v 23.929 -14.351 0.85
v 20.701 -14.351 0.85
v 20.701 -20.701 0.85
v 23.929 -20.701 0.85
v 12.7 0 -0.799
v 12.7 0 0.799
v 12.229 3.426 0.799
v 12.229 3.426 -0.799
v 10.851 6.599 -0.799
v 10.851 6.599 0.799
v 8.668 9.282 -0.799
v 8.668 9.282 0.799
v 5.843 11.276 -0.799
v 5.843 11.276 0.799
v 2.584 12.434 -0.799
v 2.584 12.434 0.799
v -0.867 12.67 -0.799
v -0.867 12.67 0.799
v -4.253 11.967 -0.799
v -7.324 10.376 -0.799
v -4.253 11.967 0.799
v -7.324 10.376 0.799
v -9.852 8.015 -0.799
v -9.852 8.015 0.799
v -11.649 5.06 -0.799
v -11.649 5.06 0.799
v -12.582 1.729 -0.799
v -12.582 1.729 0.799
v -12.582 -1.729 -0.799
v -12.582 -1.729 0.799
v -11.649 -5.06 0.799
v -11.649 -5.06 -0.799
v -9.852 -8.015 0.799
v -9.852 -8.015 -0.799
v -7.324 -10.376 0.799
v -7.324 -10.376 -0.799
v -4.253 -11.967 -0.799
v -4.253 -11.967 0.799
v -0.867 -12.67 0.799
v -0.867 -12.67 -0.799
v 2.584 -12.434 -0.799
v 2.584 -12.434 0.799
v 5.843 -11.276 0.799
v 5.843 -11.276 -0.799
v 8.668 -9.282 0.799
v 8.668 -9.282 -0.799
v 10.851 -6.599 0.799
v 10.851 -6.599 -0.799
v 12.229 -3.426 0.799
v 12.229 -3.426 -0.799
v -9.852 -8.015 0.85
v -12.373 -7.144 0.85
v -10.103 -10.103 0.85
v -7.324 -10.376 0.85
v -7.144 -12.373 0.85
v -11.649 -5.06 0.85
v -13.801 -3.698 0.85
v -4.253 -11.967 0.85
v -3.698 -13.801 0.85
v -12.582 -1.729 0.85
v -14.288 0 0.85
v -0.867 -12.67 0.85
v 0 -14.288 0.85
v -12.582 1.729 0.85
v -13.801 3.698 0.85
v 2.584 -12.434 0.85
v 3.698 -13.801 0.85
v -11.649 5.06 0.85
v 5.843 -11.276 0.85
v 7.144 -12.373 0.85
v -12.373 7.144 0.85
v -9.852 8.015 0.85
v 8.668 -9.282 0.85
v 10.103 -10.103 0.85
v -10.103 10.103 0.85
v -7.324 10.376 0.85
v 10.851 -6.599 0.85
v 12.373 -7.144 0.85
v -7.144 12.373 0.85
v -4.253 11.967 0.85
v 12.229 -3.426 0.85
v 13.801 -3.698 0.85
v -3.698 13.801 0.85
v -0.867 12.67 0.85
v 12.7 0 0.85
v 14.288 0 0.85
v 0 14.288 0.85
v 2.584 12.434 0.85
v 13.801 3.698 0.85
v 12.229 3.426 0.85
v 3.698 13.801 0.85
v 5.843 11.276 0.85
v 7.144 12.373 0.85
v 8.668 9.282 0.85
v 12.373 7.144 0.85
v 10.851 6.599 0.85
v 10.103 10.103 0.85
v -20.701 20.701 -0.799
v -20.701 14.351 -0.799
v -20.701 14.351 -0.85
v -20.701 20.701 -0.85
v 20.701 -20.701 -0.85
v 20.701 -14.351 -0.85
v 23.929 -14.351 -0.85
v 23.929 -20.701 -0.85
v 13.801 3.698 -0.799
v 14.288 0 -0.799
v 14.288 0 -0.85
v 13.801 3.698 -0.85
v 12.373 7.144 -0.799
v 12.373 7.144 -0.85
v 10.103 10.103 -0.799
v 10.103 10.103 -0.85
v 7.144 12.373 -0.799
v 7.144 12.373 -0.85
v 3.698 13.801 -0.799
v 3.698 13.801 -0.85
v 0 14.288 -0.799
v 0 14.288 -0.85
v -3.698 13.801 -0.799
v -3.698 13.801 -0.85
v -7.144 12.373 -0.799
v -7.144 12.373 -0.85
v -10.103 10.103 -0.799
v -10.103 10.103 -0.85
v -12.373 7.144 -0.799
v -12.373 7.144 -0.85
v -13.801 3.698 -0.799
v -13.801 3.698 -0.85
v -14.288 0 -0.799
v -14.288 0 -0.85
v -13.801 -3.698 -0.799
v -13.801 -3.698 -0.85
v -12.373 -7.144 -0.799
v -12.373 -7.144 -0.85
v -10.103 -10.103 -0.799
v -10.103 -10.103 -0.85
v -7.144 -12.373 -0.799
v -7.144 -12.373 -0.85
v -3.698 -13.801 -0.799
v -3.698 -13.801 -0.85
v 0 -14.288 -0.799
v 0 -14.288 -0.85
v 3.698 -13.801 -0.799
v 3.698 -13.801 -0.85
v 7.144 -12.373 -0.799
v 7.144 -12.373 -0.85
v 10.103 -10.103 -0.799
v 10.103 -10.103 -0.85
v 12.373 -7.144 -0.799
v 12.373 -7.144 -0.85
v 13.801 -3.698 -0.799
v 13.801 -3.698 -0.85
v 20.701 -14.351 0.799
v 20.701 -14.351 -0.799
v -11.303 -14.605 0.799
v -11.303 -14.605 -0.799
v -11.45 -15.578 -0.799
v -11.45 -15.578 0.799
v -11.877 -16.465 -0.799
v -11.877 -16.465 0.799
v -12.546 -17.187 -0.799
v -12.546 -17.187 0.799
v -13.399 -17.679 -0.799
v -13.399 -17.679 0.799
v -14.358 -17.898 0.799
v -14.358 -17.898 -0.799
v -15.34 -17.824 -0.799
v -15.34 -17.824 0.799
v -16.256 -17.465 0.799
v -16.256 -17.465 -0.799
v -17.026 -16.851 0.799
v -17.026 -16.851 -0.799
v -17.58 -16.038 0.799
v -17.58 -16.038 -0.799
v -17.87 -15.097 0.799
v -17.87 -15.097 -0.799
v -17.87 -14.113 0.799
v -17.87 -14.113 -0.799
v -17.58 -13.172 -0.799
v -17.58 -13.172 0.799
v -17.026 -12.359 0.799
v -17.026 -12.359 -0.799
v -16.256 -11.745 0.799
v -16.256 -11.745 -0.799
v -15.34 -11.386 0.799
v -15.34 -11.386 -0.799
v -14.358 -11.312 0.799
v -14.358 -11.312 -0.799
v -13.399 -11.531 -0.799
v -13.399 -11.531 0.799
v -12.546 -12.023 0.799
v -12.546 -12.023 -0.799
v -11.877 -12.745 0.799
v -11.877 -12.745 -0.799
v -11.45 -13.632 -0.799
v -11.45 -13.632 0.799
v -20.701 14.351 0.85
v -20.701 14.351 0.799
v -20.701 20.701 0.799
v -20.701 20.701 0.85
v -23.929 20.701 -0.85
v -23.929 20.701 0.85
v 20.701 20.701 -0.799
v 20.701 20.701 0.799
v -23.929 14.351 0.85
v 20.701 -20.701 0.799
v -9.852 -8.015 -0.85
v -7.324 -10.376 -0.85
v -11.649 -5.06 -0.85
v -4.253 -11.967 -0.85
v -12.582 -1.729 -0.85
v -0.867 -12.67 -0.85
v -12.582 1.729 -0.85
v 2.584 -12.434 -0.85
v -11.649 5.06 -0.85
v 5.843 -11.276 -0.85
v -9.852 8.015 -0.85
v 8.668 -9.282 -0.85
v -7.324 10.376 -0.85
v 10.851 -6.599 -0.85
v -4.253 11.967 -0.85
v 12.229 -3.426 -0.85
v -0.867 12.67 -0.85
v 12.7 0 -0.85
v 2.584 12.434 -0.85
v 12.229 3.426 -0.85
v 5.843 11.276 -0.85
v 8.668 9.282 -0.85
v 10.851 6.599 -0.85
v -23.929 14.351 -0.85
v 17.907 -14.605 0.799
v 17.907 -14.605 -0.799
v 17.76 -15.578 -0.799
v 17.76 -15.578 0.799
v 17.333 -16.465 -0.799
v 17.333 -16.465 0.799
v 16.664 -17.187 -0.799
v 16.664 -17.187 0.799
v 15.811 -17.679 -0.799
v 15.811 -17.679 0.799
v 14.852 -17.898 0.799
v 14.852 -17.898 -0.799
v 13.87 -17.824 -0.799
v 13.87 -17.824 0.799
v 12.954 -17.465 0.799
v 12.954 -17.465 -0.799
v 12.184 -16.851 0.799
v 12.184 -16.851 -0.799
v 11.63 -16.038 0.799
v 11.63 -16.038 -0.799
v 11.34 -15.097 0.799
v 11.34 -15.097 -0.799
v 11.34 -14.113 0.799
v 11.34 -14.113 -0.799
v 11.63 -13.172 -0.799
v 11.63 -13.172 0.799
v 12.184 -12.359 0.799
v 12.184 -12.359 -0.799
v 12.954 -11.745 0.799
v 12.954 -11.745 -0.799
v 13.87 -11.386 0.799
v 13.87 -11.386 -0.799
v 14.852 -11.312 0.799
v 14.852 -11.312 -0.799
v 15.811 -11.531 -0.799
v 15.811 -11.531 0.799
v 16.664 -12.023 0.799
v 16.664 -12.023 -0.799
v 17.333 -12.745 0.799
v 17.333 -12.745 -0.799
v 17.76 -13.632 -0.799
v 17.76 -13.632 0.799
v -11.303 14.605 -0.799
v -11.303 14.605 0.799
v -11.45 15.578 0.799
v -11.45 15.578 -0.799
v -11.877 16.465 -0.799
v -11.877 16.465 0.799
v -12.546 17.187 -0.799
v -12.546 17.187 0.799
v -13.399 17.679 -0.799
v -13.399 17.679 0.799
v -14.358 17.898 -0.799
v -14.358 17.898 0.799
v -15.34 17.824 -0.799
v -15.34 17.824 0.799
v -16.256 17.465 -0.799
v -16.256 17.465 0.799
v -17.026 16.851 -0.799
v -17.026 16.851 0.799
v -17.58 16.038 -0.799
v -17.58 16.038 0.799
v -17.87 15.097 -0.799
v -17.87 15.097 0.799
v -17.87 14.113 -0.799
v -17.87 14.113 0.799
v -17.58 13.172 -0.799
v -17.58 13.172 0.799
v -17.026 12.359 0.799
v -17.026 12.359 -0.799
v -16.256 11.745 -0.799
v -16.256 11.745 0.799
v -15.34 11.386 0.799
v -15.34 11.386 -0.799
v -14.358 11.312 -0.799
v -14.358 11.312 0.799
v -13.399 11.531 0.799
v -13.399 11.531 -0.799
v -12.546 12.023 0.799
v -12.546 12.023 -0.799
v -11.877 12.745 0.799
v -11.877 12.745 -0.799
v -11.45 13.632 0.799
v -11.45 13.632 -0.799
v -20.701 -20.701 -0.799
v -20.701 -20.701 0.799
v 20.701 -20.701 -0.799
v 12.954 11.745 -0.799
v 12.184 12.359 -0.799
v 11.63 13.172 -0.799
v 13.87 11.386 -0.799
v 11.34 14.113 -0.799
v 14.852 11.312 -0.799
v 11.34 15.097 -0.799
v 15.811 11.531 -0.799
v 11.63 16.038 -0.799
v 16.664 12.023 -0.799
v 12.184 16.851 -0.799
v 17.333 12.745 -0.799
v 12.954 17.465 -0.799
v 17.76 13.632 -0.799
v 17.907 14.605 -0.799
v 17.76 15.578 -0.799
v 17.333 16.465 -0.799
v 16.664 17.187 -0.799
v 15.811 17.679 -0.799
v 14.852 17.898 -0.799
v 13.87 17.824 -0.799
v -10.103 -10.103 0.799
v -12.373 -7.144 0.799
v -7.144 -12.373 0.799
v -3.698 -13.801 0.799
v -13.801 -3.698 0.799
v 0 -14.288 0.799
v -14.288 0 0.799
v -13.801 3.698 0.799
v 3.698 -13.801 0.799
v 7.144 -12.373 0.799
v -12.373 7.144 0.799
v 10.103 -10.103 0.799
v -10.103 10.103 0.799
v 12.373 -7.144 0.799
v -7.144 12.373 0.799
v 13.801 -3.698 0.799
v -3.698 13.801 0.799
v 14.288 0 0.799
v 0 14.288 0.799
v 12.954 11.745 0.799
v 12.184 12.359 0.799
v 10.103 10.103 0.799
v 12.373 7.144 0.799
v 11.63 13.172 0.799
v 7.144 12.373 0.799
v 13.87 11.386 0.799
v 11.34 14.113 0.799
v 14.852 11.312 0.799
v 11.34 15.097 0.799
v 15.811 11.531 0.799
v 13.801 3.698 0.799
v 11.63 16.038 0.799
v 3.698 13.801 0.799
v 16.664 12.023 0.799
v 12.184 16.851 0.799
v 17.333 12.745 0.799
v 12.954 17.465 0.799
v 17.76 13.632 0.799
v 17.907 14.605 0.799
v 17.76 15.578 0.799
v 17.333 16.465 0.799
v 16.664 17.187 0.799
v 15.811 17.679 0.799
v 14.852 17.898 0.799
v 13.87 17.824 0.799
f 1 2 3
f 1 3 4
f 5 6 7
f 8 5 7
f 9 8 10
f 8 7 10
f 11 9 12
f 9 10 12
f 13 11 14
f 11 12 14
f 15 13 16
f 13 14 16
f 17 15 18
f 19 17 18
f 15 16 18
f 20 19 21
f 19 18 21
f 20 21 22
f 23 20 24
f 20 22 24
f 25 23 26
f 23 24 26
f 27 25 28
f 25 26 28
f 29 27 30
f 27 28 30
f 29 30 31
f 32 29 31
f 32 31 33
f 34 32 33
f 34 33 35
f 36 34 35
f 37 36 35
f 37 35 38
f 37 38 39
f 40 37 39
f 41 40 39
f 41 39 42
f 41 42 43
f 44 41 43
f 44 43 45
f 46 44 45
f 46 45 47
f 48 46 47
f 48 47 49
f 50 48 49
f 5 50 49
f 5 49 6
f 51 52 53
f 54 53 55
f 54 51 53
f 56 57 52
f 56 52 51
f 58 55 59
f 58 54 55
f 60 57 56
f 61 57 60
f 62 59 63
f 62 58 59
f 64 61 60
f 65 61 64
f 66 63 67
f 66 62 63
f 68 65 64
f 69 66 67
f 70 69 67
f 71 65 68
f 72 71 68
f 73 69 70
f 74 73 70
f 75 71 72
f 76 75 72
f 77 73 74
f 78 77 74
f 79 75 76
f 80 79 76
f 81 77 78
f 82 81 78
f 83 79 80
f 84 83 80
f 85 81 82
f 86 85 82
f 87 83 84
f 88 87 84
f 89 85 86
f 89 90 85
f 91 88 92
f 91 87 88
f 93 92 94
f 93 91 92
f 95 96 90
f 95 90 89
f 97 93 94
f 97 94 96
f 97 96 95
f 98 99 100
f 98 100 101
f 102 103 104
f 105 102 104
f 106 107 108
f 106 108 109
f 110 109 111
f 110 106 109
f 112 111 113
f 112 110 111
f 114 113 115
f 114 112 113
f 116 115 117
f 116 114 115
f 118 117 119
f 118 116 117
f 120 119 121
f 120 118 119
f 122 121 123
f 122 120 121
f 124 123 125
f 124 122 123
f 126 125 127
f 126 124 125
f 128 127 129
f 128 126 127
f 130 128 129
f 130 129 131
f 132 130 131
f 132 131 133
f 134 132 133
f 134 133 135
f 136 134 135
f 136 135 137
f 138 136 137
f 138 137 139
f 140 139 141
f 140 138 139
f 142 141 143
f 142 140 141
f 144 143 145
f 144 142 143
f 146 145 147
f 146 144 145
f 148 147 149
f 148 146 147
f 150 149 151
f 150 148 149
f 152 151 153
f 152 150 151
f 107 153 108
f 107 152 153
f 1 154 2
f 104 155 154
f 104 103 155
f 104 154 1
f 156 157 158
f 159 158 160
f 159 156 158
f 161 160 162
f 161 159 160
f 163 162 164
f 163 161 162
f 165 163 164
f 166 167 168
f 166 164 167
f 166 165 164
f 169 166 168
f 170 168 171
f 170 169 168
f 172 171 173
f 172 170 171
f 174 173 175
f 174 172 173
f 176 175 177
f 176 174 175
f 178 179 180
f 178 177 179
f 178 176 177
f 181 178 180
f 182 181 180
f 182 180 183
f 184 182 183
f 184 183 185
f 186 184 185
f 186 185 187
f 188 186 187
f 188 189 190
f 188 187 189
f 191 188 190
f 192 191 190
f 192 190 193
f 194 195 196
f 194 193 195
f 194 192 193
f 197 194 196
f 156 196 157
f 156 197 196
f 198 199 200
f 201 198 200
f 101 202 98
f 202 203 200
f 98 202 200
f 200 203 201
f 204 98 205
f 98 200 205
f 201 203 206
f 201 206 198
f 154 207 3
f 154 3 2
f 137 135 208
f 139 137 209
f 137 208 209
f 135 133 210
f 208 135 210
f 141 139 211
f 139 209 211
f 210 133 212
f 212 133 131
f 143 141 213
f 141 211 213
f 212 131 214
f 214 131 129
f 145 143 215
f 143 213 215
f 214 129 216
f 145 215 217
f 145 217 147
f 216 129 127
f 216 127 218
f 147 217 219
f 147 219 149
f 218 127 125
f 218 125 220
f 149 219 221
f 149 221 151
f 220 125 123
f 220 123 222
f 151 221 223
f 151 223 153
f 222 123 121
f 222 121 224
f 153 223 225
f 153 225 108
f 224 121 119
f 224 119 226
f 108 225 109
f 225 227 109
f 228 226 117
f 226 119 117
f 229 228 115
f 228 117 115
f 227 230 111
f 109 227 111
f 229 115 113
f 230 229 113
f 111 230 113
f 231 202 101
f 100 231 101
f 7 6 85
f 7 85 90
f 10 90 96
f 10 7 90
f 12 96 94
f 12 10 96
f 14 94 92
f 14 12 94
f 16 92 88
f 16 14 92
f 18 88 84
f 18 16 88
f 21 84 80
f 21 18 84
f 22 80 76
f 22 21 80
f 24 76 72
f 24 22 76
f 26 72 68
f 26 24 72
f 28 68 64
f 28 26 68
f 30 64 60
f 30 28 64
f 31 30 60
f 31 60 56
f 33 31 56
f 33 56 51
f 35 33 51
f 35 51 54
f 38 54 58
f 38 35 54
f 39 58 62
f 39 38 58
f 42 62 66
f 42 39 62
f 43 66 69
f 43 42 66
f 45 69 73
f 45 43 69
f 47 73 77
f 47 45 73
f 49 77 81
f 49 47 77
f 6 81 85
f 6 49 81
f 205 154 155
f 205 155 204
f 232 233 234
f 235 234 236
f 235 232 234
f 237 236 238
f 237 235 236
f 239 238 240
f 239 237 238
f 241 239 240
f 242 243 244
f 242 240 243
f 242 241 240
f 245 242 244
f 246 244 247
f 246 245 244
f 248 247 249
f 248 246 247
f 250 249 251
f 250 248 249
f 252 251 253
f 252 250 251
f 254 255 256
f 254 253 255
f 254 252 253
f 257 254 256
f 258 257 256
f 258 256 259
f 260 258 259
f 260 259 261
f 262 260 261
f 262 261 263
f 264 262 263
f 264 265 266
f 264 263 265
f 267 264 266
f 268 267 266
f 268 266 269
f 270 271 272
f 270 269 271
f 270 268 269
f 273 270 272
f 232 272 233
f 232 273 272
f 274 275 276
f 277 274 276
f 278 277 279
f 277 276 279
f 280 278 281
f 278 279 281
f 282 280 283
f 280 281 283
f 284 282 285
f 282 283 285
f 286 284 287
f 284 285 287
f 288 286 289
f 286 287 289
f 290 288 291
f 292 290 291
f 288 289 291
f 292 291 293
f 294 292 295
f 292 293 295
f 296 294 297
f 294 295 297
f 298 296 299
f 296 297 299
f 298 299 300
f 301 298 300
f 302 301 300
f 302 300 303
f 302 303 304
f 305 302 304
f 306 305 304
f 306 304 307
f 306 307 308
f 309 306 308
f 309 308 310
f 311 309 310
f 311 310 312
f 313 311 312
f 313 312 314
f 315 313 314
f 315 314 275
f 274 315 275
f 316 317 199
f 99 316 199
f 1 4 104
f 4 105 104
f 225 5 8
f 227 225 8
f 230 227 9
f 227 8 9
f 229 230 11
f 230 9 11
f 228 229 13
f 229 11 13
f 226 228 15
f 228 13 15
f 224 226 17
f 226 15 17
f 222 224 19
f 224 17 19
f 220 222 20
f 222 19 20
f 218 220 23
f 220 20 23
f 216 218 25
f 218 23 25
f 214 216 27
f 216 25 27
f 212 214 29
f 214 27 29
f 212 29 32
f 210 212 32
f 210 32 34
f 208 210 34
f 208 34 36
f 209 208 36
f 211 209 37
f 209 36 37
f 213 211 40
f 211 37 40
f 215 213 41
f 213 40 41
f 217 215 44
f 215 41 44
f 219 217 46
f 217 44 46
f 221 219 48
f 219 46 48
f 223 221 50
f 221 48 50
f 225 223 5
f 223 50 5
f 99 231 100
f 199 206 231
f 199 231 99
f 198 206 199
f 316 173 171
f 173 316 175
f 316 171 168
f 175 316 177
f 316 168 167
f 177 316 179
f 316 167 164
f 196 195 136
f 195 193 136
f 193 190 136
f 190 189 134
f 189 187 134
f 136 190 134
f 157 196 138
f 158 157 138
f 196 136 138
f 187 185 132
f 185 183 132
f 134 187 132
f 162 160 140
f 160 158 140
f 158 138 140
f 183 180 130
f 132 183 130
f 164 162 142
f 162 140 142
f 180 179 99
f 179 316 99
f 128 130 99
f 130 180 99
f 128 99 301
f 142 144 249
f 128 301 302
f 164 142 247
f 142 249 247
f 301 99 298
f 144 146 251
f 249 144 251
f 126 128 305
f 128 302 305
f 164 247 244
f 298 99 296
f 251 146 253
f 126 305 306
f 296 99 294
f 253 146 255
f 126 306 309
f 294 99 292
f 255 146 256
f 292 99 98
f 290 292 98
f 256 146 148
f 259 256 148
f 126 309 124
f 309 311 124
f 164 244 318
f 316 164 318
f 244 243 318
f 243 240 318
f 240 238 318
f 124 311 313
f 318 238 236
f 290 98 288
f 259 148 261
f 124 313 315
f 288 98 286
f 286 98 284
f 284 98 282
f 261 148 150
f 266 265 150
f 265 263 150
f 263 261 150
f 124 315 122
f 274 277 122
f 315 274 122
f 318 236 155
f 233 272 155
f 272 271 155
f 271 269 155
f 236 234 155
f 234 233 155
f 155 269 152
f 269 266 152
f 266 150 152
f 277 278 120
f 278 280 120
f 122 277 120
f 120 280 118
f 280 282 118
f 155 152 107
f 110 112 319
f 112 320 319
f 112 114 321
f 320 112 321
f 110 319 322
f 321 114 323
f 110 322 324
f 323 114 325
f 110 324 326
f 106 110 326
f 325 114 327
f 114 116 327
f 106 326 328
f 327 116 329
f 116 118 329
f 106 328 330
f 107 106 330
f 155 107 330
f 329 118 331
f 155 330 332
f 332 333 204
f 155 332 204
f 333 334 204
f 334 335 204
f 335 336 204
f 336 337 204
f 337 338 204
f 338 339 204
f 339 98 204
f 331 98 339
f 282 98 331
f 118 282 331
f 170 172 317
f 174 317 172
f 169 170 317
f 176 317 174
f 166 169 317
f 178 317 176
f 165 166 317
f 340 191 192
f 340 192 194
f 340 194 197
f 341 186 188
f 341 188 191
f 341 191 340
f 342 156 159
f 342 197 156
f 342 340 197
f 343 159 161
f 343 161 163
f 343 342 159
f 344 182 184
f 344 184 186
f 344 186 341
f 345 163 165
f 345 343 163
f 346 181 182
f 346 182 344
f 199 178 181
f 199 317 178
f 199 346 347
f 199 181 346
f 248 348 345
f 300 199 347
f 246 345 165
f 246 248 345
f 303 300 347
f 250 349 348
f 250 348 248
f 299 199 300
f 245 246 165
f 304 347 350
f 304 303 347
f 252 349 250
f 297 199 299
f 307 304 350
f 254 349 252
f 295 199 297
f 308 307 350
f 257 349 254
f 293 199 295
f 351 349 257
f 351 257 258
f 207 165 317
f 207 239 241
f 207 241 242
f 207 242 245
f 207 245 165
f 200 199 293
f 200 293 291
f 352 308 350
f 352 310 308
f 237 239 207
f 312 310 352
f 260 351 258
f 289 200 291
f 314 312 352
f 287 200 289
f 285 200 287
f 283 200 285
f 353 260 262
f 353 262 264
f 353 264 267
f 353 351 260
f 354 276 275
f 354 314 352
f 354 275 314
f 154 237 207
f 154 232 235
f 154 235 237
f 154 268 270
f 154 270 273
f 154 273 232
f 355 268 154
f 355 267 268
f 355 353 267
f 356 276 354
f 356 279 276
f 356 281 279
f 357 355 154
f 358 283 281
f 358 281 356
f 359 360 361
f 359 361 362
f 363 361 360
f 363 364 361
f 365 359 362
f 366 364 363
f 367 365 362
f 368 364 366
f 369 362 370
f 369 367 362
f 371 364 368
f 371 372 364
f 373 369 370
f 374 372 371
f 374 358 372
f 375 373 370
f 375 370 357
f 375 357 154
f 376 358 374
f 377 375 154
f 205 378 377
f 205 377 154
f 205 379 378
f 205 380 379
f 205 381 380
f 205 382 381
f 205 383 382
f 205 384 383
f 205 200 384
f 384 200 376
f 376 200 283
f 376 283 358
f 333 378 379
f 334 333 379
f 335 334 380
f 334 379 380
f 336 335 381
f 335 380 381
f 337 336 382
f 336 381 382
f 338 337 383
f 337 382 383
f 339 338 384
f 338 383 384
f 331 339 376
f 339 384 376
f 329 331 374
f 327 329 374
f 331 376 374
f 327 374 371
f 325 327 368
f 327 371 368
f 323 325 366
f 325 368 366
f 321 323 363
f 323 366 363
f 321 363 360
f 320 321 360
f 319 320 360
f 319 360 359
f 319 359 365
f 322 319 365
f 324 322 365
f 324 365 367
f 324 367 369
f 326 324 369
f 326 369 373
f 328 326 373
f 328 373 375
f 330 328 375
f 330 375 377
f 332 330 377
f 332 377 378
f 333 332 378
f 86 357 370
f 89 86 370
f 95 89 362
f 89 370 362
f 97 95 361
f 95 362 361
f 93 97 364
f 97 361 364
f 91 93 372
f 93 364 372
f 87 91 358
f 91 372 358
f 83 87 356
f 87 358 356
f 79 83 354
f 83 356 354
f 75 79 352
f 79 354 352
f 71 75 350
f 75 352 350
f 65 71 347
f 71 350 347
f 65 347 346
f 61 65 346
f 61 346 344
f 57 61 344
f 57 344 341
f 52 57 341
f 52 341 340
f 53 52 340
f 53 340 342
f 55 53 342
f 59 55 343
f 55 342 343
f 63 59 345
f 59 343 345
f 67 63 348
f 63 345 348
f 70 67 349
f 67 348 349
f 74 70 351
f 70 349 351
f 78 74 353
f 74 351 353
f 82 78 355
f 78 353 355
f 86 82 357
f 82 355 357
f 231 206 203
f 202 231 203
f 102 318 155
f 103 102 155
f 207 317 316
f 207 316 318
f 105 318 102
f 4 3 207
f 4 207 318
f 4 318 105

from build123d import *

# Parameters (mm, degrees)
SKETCH1_W                = 41.402
SKETCH1_H                = 41.402
BOSS_EXTRUDE1_DEPTH      = 0.79883
BOSS_EXTRUDE1_DEPTH_BACK = 0.79883
SKETCH2_W                = 3.22834
SKETCH2_H                = 6.35
BOSS_EXTRUDE2_DEPTH      = 0.79883
BOSS_EXTRUDE2_DEPTH_BACK = 0.79883
SKETCH3_R                = 12.7
CUT_EXTRUDE1_DEPTH       = 2.59766
SKETCH4_R                = 14.2875
SKETCH4_R_2              = 12.7
BOSS_EXTRUDE3_DEPTH      = 0.0508
SKETCH5_W                = 3.22834
SKETCH5_H                = 6.35
BOSS_EXTRUDE4_DEPTH      = 0.0508
SKETCH6_R                = 3.302
CUT_EXTRUDE2_DEPTH       = 2.64846


with BuildPart() as part:
    # Sketch1 → Boss-Extrude1 (new body, two sides)
    with BuildSketch(Plane.XY) as boss_extrude1_sk:
        Rectangle(SKETCH1_W, SKETCH1_H)
    extrude(amount=BOSS_EXTRUDE1_DEPTH)
    extrude(boss_extrude1_sk.sketch, amount=-BOSS_EXTRUDE1_DEPTH_BACK)

    # Sketch2 → Boss-Extrude2 (add, two sides)
    with BuildSketch(Plane.XY) as boss_extrude2_sk:
        with Locations((-22.31517, 17.526)):
            Rectangle(SKETCH2_W, SKETCH2_H)
        with Locations((22.31517, -17.526)):
            Rectangle(SKETCH2_W, SKETCH2_H)
    extrude(amount=BOSS_EXTRUDE2_DEPTH)
    extrude(boss_extrude2_sk.sketch, amount=-BOSS_EXTRUDE2_DEPTH_BACK)

    # Sketch3 → Cut-Extrude1 (cut, through all)
    with BuildSketch(Plane.XY.offset(0.79883)):
        Circle(SKETCH3_R)
    extrude(amount=-CUT_EXTRUDE1_DEPTH, mode=Mode.SUBTRACT)

    # Sketch4 → Boss-Extrude3 (add)
    with BuildSketch(Plane.XY.offset(0.79883)):
        Circle(SKETCH4_R)
        Circle(SKETCH4_R_2, mode=Mode.SUBTRACT)
    boss_extrude3 = extrude(amount=BOSS_EXTRUDE3_DEPTH)

    # Sketch5 → Boss-Extrude4 (add)
    with BuildSketch(Plane.XY.offset(0.79883)):
        with Locations((-22.31517, 17.526)):
            Rectangle(SKETCH5_W, SKETCH5_H)
        with Locations((22.31517, -17.526)):
            Rectangle(SKETCH5_W, SKETCH5_H)
    boss_extrude4 = extrude(amount=BOSS_EXTRUDE4_DEPTH)

    # Mirror3: Boss-Extrude3, Boss-Extrude4 across plane
    add(boss_extrude3.mirror(Plane.XY))
    add(boss_extrude4.mirror(Plane.XY))

    # Sketch6 → Cut-Extrude2 (cut, through all)
    with BuildSketch(Plane.XY.offset(0.79883)):
        with Locations((-14.605, 14.605)):
            Circle(SKETCH6_R)
        with Locations((14.605, 14.605)):
            Circle(SKETCH6_R)
    cut_extrude2 = extrude(amount=-CUT_EXTRUDE2_DEPTH, mode=Mode.SUBTRACT)

    # Mirror4: Cut-Extrude2 across plane
    add(cut_extrude2.mirror(Plane.ZX), mode=Mode.SUBTRACT)


solid = part.part
